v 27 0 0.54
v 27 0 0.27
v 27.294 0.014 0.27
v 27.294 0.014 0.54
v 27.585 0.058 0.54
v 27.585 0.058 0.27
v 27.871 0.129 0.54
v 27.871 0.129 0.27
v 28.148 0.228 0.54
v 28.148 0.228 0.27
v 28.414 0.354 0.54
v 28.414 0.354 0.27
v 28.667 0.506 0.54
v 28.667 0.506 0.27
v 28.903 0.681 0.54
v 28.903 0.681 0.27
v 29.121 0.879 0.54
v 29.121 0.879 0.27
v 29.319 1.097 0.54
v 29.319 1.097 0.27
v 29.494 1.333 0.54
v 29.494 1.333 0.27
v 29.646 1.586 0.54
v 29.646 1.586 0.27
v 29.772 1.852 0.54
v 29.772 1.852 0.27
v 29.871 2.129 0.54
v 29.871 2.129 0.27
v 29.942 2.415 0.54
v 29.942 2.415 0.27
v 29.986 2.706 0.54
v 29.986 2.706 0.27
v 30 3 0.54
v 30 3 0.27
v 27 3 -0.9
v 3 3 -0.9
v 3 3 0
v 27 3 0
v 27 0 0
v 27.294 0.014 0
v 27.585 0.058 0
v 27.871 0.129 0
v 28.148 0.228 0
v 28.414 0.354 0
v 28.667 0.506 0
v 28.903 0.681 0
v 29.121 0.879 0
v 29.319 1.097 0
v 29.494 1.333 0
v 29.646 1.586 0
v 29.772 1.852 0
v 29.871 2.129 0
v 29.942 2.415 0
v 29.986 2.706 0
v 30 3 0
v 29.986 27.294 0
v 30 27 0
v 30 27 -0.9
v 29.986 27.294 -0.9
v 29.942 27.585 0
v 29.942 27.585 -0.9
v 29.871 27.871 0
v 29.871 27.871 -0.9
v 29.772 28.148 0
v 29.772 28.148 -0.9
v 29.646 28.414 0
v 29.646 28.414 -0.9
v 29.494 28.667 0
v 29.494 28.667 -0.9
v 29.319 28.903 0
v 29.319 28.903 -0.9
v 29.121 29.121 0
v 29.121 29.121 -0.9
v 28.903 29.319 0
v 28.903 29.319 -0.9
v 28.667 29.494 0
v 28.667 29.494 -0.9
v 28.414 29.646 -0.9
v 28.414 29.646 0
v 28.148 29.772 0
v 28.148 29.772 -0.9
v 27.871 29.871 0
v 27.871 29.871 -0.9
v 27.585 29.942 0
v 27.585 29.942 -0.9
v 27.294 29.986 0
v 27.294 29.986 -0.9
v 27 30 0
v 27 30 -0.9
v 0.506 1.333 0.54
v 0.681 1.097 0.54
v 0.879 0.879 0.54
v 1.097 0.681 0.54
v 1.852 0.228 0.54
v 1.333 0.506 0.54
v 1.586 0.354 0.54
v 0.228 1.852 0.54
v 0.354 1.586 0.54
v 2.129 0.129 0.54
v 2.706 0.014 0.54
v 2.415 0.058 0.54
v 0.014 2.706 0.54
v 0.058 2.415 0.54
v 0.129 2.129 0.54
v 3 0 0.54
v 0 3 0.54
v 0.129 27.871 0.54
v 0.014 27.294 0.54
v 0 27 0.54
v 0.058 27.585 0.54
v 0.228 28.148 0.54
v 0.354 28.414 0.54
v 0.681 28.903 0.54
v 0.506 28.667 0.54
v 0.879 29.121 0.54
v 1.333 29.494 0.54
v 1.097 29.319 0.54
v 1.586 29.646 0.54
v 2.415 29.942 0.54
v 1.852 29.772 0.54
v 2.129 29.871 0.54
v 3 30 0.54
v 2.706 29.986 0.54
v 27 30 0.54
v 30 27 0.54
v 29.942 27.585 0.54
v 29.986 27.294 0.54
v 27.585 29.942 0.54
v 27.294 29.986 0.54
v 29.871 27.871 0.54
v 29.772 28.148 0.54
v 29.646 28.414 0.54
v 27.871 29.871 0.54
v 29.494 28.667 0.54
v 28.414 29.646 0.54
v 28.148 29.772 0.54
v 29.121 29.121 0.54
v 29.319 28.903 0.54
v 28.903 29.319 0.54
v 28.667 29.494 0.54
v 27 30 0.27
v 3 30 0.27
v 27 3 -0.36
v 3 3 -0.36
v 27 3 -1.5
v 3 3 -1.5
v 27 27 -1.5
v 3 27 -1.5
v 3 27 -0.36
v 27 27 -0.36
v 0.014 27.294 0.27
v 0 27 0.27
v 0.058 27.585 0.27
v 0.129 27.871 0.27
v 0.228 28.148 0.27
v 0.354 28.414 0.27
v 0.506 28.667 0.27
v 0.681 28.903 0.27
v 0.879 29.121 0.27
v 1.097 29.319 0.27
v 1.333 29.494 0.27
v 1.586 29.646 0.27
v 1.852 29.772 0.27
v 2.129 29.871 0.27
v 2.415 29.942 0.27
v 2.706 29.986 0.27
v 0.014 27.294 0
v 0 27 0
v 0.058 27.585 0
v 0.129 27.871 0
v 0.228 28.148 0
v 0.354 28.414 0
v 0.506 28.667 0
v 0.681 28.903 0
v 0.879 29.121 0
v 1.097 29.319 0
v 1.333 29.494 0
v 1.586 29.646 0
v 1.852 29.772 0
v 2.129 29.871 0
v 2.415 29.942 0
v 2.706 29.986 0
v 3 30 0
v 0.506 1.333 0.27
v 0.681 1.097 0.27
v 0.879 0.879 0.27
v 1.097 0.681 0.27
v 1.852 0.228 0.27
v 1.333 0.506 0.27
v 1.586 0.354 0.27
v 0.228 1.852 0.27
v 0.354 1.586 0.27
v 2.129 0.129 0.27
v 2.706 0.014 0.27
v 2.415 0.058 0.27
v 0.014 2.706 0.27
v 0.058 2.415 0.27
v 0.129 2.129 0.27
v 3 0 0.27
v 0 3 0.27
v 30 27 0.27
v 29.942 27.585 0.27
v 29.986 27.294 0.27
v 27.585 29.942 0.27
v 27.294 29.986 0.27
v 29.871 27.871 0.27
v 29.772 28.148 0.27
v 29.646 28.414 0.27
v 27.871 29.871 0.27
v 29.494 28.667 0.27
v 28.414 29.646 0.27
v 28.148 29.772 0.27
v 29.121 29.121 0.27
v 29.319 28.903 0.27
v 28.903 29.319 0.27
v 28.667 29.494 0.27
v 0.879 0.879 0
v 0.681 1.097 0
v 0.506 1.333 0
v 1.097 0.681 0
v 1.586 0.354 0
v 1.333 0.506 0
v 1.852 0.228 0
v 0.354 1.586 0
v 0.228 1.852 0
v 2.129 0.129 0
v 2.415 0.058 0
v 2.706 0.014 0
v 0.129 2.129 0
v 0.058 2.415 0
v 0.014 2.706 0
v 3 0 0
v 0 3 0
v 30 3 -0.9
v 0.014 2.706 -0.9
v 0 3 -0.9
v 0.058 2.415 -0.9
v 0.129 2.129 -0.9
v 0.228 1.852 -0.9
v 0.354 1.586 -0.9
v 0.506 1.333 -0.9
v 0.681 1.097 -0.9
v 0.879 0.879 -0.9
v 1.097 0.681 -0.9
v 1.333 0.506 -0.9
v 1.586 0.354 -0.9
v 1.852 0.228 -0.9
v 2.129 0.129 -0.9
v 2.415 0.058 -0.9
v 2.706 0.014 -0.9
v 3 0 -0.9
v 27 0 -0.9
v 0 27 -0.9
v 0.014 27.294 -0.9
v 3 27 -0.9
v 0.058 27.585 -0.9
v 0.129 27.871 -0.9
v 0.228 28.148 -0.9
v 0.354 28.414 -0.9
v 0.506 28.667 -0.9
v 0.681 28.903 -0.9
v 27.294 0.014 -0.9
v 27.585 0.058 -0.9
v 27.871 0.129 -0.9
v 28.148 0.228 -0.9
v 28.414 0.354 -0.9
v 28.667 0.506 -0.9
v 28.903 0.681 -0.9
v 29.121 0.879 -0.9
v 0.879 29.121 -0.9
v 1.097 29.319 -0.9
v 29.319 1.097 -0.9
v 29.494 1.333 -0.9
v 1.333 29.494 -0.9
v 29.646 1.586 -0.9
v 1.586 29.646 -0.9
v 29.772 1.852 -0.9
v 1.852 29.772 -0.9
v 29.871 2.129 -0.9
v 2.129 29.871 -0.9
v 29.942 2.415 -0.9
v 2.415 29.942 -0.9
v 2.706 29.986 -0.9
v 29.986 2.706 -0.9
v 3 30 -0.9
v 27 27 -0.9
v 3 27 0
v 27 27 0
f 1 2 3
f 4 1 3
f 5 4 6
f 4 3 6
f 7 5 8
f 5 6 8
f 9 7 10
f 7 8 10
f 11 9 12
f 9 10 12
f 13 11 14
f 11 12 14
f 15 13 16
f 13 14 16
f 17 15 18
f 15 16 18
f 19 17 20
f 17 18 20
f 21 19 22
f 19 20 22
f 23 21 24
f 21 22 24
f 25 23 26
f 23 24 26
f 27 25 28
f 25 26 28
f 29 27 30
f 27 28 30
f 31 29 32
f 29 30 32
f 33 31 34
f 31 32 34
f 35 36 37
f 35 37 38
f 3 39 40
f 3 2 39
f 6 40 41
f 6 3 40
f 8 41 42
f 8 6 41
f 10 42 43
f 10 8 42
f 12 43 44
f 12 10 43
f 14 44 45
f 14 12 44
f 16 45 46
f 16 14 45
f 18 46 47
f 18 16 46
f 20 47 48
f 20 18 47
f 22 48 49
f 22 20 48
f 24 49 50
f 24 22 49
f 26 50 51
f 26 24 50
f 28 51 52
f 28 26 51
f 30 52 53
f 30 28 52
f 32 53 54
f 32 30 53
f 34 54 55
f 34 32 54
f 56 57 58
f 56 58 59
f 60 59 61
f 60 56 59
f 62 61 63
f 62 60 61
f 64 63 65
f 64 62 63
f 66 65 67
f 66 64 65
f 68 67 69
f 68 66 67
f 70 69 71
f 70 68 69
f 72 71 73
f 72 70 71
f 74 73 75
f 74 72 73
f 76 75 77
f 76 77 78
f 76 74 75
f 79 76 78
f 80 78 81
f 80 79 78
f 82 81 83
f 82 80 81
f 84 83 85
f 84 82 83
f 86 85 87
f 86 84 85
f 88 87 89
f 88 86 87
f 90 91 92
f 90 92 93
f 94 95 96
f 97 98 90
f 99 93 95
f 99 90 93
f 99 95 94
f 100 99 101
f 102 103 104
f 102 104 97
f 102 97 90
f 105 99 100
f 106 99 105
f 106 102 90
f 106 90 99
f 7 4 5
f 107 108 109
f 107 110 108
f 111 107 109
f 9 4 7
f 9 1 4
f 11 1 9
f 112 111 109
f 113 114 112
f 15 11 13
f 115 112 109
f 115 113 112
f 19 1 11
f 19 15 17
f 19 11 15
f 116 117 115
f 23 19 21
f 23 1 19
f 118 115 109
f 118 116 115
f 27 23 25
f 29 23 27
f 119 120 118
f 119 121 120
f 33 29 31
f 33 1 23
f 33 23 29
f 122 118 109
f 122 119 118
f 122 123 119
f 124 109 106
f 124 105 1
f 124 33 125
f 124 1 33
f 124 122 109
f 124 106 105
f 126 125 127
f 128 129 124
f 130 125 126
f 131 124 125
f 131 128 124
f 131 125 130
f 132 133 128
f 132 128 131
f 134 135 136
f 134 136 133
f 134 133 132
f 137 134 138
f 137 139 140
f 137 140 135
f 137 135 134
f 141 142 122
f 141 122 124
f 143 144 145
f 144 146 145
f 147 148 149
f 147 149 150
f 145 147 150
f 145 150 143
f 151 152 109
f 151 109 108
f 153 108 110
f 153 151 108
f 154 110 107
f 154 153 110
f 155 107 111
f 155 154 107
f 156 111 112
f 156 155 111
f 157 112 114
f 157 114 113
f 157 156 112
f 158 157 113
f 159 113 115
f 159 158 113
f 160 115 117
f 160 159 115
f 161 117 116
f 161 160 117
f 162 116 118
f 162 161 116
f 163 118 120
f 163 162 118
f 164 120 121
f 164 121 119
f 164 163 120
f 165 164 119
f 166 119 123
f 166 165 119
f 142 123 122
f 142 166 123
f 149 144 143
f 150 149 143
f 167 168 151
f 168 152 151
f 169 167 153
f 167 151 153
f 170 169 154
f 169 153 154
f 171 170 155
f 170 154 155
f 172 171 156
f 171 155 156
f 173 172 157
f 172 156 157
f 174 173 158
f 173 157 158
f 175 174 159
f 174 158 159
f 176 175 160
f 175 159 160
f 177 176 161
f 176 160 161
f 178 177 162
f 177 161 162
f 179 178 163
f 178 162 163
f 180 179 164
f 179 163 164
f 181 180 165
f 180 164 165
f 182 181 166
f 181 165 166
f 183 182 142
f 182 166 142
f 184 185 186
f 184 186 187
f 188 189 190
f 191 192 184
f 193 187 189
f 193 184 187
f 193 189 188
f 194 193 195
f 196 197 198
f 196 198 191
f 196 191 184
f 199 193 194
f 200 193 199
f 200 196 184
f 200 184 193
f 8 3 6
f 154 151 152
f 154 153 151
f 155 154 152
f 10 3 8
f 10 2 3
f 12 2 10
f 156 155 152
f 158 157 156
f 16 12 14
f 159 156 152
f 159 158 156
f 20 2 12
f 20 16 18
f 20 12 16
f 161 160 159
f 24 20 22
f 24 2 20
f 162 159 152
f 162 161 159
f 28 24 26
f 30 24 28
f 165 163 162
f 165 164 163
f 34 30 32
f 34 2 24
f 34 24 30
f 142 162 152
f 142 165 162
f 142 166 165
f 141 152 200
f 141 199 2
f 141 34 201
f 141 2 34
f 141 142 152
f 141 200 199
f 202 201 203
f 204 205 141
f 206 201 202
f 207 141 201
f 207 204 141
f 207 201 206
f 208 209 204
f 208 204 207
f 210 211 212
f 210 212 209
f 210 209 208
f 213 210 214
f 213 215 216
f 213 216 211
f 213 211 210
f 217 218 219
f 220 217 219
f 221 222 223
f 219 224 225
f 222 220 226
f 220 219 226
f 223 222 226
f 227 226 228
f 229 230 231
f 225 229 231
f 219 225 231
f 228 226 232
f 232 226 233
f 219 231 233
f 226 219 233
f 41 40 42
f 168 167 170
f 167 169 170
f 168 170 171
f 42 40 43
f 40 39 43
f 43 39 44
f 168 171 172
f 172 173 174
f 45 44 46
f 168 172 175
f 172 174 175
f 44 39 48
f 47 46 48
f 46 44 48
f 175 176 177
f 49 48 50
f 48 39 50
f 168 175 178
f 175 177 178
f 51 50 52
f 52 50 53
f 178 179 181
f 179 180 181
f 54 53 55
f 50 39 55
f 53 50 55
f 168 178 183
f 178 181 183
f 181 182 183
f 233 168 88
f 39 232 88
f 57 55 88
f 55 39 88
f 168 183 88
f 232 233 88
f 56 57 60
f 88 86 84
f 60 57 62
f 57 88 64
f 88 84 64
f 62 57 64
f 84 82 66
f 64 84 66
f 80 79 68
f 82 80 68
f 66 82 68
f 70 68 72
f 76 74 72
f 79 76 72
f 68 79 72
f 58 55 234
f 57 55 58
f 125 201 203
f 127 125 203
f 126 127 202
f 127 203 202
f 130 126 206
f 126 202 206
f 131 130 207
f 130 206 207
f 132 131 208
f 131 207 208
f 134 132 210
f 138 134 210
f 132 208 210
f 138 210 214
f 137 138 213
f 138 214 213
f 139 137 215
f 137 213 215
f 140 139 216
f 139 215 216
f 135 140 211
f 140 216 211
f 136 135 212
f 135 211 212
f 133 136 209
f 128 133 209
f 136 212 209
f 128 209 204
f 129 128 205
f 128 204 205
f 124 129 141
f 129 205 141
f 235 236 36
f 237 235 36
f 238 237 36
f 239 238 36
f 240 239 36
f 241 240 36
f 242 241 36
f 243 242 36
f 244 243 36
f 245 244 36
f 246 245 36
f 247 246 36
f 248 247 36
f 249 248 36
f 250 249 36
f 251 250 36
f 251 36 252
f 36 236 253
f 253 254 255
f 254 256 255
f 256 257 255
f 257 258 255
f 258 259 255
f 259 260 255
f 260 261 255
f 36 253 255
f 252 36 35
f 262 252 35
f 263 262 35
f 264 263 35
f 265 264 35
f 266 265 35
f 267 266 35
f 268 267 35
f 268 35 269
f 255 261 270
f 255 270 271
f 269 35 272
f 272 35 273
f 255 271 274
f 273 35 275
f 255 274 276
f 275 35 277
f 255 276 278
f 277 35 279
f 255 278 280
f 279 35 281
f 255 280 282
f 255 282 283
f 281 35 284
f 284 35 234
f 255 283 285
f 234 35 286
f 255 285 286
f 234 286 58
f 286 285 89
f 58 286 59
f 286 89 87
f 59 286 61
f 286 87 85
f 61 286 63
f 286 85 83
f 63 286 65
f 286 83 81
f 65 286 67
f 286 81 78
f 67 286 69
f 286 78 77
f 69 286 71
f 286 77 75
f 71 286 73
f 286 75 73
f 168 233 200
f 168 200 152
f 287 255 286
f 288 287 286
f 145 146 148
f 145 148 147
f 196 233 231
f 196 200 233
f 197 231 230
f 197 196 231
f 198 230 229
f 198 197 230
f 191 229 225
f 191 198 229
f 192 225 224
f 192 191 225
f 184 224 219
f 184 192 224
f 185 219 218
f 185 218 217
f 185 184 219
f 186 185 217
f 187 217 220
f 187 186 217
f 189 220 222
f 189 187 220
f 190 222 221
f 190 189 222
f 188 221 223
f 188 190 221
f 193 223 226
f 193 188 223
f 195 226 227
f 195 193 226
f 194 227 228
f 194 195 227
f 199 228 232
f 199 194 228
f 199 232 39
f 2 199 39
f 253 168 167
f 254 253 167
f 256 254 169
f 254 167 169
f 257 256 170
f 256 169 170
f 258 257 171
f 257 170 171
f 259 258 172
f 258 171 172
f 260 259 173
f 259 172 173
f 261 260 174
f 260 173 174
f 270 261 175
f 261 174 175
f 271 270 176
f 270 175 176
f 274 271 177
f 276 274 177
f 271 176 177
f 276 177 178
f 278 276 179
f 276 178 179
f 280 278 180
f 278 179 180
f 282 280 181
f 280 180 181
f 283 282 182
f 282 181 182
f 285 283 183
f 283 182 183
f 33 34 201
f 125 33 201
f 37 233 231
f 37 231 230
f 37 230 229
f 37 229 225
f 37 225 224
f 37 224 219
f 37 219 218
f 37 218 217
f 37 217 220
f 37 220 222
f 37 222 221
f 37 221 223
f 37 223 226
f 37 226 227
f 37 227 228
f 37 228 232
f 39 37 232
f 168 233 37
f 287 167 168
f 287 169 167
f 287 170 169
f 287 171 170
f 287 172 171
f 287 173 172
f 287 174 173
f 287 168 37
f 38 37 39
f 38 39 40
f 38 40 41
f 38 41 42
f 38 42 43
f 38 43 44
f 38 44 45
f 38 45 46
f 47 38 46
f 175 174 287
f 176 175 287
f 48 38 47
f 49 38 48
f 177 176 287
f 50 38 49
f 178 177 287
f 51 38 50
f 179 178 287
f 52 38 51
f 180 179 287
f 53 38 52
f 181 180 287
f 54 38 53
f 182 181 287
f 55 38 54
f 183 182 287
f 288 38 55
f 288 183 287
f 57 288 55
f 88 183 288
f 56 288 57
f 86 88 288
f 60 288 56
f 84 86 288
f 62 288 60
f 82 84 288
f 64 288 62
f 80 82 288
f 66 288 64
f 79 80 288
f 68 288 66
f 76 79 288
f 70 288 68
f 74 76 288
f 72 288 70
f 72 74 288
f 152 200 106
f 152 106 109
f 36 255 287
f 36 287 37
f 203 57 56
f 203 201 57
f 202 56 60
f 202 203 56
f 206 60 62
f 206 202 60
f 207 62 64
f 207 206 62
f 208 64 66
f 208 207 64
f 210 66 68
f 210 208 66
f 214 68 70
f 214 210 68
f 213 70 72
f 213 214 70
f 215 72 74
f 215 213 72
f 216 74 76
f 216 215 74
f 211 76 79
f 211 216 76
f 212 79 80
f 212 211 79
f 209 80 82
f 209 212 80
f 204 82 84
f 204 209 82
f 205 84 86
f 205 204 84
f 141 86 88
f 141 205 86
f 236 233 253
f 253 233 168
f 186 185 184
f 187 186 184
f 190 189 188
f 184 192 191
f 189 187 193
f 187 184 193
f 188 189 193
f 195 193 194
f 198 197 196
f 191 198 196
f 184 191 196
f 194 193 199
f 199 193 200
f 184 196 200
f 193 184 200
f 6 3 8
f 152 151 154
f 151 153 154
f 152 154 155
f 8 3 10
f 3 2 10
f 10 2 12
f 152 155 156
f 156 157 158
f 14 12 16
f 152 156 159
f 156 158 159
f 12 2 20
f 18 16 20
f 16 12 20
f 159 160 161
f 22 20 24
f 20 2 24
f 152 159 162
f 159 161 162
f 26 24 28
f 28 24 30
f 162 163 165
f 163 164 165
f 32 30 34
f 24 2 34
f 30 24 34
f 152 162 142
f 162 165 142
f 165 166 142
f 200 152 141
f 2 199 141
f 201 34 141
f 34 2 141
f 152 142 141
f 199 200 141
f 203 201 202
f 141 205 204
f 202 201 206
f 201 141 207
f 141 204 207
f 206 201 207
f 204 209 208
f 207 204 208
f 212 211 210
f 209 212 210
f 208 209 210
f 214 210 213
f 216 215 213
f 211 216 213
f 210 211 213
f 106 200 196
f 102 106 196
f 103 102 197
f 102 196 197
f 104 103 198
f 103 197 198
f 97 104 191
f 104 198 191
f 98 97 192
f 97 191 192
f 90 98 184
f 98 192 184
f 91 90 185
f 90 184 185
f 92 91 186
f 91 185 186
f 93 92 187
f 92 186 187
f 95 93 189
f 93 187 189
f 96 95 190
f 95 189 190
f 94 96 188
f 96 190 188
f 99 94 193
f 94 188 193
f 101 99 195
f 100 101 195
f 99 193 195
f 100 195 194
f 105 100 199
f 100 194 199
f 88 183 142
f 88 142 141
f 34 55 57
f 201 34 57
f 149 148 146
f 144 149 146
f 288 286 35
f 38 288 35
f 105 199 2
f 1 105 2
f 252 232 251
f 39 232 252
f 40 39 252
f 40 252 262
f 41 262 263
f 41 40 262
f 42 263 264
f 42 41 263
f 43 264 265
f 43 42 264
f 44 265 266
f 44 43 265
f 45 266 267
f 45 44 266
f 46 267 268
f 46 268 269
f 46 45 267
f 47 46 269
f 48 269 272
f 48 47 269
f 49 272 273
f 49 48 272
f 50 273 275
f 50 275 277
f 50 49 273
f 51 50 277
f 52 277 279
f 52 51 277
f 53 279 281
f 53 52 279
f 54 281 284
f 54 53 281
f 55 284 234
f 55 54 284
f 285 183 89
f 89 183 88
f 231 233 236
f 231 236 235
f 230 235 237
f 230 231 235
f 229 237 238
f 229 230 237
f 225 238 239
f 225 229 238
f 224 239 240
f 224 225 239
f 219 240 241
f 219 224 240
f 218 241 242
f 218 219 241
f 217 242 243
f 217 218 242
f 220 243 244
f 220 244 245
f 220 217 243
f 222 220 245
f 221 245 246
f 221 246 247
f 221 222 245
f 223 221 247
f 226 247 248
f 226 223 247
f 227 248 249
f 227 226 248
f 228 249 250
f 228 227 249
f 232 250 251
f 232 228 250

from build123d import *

# Parameters (mm, degrees)
F0_W     = 30
F0_H     = 30
F1_DEPTH = 0.27
F2_R     = 3
F3_DEPTH = 0.27
F4_DEPTH = 0.9
F5_W     = 24
F5_H     = 24
F6_DEPTH = 25
F7_DEPTH = 0.6
F8_DEPTH = 0.54


with BuildPart() as f1:
    # F0 (on Top) → F1 (new body)
    with BuildSketch(Plane.XY):
        with Locations((15, 15)):
            Rectangle(F0_W, F0_H)
    extrude(amount=F1_DEPTH)

    # F2
    f2_edges = [f1.edges().sort_by_distance(p)[0] for p in [
        (30, 0, 0.135),
        (30, 30, 0.135),
        (0, 30, 0.135),
        (0, 0, 0.135),
    ]]
    fillet(f2_edges, radius=F2_R)


with BuildPart() as f3:
    # F3 (new): a face of the model
    f3_faces = [f1.part.faces().sort_by_distance(p)[0] for p in [
        (15, 15, 0.27),
    ]]
    extrude(f3_faces, amount=F3_DEPTH)


with BuildPart() as f4:
    # F4 (new): a face of the model
    f4_faces = [f1.part.faces().sort_by_distance(p)[0] for p in [
        (15, 15, 0),
    ]]
    extrude(f4_faces, amount=F4_DEPTH)

    # F5 (on face) → F6 (cut)
    with BuildSketch(Plane(origin=(0, 0, -0.9), x_dir=(1, 0, 0), z_dir=(0, 0, -1))):
        with Locations((15, -15)):
            Rectangle(F5_W, F5_H)
    extrude(amount=-F6_DEPTH, mode=Mode.SUBTRACT)


with BuildPart() as f7:
    # F5 (on face) → F7 (new body)
    with BuildSketch(Plane(origin=(0, 0, -0.9), x_dir=(1, 0, 0), z_dir=(0, 0, -1))):
        with Locations((15, -15)):
            Rectangle(F5_W, F5_H)
    extrude(amount=F7_DEPTH)

    # F5 (on face) → F8 (join)
    with BuildSketch(Plane(origin=(0, 0, -0.9), x_dir=(1, 0, 0), z_dir=(0, 0, -1))):
        with Locations((15, -15)):
            Rectangle(F5_W, F5_H)
    extrude(amount=-F8_DEPTH)


solid = Compound([f1.part, f3.part, f4.part, f7.part])
